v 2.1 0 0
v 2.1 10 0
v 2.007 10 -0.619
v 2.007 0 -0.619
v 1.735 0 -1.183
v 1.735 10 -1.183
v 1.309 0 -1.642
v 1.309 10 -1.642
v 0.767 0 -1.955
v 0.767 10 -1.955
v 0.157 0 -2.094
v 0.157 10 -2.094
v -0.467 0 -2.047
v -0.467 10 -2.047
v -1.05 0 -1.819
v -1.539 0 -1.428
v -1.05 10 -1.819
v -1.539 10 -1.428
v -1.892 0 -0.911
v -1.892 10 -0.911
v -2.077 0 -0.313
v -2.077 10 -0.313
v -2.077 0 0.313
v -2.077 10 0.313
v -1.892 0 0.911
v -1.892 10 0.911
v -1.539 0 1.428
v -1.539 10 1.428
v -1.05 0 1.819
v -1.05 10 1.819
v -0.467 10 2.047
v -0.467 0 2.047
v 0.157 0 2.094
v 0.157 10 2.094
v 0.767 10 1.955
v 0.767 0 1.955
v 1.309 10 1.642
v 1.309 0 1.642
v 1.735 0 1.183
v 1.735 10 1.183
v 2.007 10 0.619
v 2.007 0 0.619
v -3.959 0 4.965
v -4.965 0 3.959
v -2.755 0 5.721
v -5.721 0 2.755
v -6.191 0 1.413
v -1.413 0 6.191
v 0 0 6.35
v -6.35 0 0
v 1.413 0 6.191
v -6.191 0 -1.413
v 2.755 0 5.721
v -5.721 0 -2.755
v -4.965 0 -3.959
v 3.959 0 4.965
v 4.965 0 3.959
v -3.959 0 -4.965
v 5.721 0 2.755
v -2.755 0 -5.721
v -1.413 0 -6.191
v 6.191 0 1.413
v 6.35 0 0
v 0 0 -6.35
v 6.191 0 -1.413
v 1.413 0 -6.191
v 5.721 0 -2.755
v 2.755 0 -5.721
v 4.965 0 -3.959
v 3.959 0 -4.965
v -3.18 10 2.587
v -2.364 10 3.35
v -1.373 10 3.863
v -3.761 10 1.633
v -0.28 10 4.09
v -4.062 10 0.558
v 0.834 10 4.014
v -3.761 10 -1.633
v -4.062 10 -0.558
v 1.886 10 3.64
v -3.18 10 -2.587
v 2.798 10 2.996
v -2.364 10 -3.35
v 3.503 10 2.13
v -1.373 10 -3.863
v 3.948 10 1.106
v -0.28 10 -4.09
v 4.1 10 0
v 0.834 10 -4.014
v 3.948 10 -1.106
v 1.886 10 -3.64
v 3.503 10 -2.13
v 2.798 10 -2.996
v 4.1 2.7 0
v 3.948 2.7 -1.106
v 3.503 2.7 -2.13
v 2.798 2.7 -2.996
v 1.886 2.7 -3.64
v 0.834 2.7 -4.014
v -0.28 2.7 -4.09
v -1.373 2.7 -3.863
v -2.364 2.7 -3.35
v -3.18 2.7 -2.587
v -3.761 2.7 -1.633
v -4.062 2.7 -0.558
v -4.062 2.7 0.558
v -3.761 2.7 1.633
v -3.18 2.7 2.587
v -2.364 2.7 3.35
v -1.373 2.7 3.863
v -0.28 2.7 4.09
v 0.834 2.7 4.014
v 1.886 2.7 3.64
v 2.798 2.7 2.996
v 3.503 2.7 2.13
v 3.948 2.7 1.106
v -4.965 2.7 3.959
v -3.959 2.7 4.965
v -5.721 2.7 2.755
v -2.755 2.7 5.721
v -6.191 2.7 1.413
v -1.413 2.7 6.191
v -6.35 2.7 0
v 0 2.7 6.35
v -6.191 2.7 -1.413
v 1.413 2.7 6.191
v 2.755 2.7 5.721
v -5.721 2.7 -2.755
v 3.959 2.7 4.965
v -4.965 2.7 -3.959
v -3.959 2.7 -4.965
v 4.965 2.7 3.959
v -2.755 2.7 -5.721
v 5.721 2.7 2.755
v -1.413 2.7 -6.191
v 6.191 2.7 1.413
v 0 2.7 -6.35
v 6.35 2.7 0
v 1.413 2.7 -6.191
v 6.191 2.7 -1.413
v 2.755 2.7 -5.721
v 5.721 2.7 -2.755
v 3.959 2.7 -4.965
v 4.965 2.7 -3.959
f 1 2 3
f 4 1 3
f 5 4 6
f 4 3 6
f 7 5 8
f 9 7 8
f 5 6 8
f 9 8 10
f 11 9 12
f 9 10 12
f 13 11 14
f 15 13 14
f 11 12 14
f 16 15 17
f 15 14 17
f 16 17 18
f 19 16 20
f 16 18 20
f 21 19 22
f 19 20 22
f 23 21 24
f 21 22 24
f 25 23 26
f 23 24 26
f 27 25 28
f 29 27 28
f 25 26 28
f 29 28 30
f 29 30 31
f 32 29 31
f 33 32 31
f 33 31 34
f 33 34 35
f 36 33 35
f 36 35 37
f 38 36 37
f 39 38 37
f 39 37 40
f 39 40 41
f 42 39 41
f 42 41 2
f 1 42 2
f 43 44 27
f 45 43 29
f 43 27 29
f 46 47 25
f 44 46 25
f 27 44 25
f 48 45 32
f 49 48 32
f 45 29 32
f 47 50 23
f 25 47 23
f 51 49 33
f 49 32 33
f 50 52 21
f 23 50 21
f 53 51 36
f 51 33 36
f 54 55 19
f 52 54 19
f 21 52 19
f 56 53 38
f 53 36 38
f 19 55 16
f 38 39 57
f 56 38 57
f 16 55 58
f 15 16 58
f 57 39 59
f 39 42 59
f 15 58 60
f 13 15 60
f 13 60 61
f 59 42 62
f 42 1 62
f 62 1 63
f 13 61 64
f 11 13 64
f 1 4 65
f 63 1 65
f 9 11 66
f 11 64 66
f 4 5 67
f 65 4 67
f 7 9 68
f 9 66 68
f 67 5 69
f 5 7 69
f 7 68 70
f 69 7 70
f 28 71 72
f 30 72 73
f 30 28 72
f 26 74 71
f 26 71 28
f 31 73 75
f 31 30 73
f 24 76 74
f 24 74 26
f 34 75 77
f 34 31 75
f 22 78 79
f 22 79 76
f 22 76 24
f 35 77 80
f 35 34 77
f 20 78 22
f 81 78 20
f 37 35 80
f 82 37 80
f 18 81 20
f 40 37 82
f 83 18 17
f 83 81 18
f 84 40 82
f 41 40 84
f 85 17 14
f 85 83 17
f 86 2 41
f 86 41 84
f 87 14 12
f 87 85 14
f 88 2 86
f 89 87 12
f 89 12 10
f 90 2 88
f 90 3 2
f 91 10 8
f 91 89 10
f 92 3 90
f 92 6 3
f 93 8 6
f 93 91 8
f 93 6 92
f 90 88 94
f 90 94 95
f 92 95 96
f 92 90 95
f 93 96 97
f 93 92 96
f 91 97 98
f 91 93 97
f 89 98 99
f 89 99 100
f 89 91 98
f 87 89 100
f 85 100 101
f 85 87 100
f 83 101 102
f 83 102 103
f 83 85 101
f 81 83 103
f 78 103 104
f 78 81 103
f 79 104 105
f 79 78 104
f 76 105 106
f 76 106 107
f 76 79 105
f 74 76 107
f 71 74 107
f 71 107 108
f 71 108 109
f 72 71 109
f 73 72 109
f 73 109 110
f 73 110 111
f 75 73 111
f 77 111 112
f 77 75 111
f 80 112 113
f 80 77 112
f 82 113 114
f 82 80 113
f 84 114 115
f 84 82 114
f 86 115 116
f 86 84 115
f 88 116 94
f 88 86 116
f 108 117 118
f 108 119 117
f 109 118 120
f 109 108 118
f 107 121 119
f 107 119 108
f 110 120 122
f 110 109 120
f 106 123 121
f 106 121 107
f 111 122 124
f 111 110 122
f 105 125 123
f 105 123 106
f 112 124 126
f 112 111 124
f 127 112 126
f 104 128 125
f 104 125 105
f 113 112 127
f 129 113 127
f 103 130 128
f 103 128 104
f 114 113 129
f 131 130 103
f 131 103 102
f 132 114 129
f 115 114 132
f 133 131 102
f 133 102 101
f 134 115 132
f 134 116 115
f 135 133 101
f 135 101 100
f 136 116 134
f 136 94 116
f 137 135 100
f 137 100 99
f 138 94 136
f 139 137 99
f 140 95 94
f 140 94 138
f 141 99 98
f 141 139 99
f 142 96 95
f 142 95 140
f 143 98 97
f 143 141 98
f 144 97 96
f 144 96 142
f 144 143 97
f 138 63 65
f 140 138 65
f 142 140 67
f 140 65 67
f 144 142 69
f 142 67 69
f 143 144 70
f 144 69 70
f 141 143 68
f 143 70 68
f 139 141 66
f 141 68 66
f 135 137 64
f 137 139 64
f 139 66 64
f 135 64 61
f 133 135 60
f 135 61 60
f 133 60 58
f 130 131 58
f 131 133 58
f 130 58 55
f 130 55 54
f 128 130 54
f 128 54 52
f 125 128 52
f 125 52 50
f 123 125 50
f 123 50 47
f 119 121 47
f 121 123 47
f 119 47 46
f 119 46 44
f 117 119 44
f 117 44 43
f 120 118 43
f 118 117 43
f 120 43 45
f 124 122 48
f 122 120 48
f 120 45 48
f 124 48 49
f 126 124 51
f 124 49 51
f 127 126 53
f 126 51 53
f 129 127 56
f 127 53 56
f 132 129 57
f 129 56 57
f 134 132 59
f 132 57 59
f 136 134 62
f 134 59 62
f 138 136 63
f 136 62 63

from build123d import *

# Parameters (mm, degrees)
SKETCH1_R               = 6.35
BASE_BODY_DEPTH         = 10
SKETCH2_R               = 2.1
SHAFT_BEARING_CUT_DEPTH = 11
SKETCH3_OUTSIDE_W       = 18.812
SKETCH3_OUTSIDE_H       = 18.812
SKETCH3_OUTSIDE_R       = 4.1
LATHE_CUT_DEPTH         = 7.3


with BuildPart() as part:
    # Sketch1 → base_body (new body)
    with BuildSketch(Plane(origin=(0, 0, 0), x_dir=(1, 0, 0), z_dir=(0, 1, 0))):
        Circle(SKETCH1_R)
    extrude(amount=BASE_BODY_DEPTH)

    # Sketch2 → shaft_bearing_cut (cut, through all)
    with BuildSketch(Plane(origin=(0, 10, 0), x_dir=(1, 0, 0), z_dir=(0, 1, 0))):
        Circle(SKETCH2_R)
    extrude(amount=-SHAFT_BEARING_CUT_DEPTH, mode=Mode.SUBTRACT)

    # Sketch3 outside → lathe_cut (cut)
    with BuildSketch(Plane(origin=(0, 10, 0), x_dir=(1, 0, 0), z_dir=(0, 1, 0))):
        Rectangle(SKETCH3_OUTSIDE_W, SKETCH3_OUTSIDE_H)
        Circle(SKETCH3_OUTSIDE_R, mode=Mode.SUBTRACT)
    extrude(amount=-LATHE_CUT_DEPTH, mode=Mode.SUBTRACT)


solid = part.part
